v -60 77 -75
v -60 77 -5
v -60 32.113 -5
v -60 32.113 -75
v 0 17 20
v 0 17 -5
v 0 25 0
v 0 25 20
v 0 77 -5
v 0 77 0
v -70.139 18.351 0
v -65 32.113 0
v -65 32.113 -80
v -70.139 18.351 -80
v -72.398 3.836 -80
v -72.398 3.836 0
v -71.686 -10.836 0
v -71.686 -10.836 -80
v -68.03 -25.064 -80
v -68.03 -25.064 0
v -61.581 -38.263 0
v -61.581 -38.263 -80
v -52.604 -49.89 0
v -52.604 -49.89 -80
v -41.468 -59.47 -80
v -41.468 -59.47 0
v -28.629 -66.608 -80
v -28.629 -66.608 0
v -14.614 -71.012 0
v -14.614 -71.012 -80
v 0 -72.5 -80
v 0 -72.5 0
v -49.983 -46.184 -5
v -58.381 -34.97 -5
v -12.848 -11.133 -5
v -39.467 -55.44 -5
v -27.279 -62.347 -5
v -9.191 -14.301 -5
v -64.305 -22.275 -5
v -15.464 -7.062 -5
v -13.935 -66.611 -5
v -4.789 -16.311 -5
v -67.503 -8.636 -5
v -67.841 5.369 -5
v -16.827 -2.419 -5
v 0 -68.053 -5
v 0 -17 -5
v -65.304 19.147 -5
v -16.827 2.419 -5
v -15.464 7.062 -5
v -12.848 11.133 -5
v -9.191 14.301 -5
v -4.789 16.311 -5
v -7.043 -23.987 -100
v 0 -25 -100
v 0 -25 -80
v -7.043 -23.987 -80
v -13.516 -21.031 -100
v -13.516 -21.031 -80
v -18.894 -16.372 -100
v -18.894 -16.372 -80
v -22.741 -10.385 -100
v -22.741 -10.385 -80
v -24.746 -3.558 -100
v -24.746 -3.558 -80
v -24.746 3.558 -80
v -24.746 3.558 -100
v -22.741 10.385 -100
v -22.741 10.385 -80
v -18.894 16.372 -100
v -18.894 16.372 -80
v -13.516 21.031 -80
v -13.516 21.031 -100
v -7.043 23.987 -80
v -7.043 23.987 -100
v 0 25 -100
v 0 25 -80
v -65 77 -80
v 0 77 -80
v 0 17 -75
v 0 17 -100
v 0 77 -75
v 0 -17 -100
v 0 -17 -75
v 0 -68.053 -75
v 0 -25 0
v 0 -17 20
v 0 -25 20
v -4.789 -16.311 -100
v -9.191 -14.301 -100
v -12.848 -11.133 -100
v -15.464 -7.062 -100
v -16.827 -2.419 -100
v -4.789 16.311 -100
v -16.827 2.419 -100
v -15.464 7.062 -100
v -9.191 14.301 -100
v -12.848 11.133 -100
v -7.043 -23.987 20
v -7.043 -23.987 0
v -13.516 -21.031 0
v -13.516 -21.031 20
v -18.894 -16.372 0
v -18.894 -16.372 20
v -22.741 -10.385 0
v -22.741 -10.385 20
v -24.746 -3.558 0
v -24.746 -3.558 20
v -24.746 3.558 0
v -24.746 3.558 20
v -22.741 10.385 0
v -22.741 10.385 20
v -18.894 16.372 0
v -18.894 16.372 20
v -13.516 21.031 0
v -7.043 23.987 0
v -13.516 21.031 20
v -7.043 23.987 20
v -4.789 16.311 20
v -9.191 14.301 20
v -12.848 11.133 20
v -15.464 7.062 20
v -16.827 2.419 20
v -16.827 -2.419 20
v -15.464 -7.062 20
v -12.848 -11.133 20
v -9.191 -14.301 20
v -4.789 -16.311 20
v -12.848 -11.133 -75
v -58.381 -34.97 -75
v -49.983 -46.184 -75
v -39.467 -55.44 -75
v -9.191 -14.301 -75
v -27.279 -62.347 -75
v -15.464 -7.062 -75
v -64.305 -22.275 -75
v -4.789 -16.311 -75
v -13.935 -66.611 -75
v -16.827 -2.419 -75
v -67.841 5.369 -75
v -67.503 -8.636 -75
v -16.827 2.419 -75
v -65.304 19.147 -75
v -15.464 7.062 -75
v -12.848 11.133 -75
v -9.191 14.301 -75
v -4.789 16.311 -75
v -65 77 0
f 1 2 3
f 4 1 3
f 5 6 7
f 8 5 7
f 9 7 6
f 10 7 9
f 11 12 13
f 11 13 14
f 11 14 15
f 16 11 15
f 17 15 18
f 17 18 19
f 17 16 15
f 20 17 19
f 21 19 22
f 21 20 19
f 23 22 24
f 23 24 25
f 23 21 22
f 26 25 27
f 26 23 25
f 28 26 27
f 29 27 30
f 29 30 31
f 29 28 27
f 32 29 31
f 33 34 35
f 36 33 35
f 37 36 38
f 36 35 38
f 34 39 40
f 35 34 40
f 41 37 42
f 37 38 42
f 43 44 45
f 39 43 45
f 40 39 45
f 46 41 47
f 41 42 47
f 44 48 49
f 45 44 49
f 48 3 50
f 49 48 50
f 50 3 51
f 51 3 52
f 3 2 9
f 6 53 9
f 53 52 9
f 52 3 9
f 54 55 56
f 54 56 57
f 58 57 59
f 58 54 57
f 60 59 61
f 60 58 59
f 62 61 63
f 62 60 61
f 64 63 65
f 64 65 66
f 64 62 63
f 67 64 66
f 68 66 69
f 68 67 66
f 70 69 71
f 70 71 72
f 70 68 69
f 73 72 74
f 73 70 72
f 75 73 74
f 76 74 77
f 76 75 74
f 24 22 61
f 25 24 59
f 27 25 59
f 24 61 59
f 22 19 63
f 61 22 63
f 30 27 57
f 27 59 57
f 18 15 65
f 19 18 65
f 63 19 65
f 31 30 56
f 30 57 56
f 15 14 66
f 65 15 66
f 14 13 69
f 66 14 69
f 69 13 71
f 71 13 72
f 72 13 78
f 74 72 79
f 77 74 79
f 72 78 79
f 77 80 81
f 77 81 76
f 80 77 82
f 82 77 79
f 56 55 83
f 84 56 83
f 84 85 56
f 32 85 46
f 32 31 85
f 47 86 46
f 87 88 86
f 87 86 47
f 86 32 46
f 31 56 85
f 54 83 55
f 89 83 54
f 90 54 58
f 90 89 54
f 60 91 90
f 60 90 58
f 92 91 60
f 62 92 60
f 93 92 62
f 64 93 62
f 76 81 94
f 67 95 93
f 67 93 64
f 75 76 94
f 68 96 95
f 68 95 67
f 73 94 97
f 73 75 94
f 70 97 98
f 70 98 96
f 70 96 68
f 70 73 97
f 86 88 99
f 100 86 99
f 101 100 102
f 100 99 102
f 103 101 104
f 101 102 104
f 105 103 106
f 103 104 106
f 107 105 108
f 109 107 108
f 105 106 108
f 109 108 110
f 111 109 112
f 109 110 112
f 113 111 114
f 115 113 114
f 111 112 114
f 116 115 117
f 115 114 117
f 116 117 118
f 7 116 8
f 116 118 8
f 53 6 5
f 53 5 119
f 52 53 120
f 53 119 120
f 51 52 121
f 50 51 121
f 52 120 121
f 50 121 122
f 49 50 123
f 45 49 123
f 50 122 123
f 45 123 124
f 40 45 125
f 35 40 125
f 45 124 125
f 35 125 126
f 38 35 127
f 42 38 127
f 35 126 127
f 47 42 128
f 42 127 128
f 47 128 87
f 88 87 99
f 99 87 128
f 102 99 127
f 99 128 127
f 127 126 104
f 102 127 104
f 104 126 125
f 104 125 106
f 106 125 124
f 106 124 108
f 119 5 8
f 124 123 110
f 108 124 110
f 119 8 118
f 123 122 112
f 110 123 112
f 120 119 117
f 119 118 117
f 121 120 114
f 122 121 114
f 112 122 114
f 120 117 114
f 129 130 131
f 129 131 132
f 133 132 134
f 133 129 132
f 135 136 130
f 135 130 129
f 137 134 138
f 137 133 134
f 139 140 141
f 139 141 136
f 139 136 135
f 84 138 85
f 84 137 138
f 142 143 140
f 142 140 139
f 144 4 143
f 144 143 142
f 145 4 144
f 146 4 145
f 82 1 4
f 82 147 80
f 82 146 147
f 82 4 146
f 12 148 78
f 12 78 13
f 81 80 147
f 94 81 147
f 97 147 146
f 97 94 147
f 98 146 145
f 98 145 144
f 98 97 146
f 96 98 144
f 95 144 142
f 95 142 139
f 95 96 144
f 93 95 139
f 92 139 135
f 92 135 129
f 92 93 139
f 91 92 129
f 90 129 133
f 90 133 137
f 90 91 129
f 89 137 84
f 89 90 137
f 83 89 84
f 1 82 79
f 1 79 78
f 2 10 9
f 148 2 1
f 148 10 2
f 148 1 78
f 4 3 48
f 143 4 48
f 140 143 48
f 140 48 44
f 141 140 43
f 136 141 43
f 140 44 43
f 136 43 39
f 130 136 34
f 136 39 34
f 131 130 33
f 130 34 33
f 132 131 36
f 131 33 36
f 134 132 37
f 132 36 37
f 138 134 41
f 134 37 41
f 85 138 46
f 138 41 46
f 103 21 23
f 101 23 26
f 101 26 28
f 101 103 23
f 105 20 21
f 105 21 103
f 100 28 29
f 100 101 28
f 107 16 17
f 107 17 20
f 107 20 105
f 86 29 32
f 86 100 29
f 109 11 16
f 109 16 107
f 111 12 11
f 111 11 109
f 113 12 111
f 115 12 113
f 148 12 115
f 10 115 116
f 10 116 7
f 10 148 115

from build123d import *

# Parameters (mm, degrees)
BOSS_EXTRUDE1_DEPTH      = 20
BOSS_EXTRUDE1_DEPTH_BACK = 5
BOSS_EXTRUDE3_DEPTH      = 5
BOSS_EXTRUDE4_DEPTH      = 75


with BuildPart() as part:
    # Sketch1 → Boss-Extrude1 (new body, two sides)
    with BuildSketch(Plane.XY) as boss_extrude1_sk:
        with BuildLine():
            Line((0, 25), (0, 17))
            ThreePointArc((0, 17), (-17, 0), (0, -17))
            Line((0, -17), (0, -25))
            ThreePointArc((0, -25), (-25, 0), (0, 25))
        make_face()
    extrude(amount=BOSS_EXTRUDE1_DEPTH)
    extrude(boss_extrude1_sk.sketch, amount=-BOSS_EXTRUDE1_DEPTH_BACK)

    # Sketch2 → Boss-Extrude3 (add)
    with BuildSketch(Plane.XY):
        with BuildLine():
            Line((0, 25), (0, 77))
            Line((0, 77), (-65, 77))
            Line((-65, 77), (-65, 32.113081447))
            ThreePointArc((-65, 32.113081447), (-61.581037686, -38.262590053), (0, -72.5))
            Line((0, -72.5), (0, -25))
            ThreePointArc((0, -25), (-25, 0), (0, 25))
        make_face()
    extrude(amount=-BOSS_EXTRUDE3_DEPTH)


with BuildPart() as body_2:
    # Mirror7: mirrored copy
    add(part.part.mirror(Plane.XY.offset(-40)))


with BuildPart() as part_1:
    add(part.part)

    add(body_2.part)  # Boss-Extrude4 merges body 2
    # Sketch3 → Boss-Extrude4 (add)
    with BuildSketch(Plane.XY):
        with BuildLine():
            Line((-65, 32.113081447), (-65, 77))
            Line((-65, 77), (-60, 77))
            Line((-60, 77), (-60, 32.113081447))
            ThreePointArc((-60, 32.113081447), (-58.380864924, -34.970339014), (0, -68.053287944))
            Line((0, -68.053287944), (0, -72.5))
            ThreePointArc((0, -72.5), (-61.581037686, -38.262590053), (-65, 32.113081447))
        make_face()
    extrude(amount=-BOSS_EXTRUDE4_DEPTH)


solid = part_1.part
